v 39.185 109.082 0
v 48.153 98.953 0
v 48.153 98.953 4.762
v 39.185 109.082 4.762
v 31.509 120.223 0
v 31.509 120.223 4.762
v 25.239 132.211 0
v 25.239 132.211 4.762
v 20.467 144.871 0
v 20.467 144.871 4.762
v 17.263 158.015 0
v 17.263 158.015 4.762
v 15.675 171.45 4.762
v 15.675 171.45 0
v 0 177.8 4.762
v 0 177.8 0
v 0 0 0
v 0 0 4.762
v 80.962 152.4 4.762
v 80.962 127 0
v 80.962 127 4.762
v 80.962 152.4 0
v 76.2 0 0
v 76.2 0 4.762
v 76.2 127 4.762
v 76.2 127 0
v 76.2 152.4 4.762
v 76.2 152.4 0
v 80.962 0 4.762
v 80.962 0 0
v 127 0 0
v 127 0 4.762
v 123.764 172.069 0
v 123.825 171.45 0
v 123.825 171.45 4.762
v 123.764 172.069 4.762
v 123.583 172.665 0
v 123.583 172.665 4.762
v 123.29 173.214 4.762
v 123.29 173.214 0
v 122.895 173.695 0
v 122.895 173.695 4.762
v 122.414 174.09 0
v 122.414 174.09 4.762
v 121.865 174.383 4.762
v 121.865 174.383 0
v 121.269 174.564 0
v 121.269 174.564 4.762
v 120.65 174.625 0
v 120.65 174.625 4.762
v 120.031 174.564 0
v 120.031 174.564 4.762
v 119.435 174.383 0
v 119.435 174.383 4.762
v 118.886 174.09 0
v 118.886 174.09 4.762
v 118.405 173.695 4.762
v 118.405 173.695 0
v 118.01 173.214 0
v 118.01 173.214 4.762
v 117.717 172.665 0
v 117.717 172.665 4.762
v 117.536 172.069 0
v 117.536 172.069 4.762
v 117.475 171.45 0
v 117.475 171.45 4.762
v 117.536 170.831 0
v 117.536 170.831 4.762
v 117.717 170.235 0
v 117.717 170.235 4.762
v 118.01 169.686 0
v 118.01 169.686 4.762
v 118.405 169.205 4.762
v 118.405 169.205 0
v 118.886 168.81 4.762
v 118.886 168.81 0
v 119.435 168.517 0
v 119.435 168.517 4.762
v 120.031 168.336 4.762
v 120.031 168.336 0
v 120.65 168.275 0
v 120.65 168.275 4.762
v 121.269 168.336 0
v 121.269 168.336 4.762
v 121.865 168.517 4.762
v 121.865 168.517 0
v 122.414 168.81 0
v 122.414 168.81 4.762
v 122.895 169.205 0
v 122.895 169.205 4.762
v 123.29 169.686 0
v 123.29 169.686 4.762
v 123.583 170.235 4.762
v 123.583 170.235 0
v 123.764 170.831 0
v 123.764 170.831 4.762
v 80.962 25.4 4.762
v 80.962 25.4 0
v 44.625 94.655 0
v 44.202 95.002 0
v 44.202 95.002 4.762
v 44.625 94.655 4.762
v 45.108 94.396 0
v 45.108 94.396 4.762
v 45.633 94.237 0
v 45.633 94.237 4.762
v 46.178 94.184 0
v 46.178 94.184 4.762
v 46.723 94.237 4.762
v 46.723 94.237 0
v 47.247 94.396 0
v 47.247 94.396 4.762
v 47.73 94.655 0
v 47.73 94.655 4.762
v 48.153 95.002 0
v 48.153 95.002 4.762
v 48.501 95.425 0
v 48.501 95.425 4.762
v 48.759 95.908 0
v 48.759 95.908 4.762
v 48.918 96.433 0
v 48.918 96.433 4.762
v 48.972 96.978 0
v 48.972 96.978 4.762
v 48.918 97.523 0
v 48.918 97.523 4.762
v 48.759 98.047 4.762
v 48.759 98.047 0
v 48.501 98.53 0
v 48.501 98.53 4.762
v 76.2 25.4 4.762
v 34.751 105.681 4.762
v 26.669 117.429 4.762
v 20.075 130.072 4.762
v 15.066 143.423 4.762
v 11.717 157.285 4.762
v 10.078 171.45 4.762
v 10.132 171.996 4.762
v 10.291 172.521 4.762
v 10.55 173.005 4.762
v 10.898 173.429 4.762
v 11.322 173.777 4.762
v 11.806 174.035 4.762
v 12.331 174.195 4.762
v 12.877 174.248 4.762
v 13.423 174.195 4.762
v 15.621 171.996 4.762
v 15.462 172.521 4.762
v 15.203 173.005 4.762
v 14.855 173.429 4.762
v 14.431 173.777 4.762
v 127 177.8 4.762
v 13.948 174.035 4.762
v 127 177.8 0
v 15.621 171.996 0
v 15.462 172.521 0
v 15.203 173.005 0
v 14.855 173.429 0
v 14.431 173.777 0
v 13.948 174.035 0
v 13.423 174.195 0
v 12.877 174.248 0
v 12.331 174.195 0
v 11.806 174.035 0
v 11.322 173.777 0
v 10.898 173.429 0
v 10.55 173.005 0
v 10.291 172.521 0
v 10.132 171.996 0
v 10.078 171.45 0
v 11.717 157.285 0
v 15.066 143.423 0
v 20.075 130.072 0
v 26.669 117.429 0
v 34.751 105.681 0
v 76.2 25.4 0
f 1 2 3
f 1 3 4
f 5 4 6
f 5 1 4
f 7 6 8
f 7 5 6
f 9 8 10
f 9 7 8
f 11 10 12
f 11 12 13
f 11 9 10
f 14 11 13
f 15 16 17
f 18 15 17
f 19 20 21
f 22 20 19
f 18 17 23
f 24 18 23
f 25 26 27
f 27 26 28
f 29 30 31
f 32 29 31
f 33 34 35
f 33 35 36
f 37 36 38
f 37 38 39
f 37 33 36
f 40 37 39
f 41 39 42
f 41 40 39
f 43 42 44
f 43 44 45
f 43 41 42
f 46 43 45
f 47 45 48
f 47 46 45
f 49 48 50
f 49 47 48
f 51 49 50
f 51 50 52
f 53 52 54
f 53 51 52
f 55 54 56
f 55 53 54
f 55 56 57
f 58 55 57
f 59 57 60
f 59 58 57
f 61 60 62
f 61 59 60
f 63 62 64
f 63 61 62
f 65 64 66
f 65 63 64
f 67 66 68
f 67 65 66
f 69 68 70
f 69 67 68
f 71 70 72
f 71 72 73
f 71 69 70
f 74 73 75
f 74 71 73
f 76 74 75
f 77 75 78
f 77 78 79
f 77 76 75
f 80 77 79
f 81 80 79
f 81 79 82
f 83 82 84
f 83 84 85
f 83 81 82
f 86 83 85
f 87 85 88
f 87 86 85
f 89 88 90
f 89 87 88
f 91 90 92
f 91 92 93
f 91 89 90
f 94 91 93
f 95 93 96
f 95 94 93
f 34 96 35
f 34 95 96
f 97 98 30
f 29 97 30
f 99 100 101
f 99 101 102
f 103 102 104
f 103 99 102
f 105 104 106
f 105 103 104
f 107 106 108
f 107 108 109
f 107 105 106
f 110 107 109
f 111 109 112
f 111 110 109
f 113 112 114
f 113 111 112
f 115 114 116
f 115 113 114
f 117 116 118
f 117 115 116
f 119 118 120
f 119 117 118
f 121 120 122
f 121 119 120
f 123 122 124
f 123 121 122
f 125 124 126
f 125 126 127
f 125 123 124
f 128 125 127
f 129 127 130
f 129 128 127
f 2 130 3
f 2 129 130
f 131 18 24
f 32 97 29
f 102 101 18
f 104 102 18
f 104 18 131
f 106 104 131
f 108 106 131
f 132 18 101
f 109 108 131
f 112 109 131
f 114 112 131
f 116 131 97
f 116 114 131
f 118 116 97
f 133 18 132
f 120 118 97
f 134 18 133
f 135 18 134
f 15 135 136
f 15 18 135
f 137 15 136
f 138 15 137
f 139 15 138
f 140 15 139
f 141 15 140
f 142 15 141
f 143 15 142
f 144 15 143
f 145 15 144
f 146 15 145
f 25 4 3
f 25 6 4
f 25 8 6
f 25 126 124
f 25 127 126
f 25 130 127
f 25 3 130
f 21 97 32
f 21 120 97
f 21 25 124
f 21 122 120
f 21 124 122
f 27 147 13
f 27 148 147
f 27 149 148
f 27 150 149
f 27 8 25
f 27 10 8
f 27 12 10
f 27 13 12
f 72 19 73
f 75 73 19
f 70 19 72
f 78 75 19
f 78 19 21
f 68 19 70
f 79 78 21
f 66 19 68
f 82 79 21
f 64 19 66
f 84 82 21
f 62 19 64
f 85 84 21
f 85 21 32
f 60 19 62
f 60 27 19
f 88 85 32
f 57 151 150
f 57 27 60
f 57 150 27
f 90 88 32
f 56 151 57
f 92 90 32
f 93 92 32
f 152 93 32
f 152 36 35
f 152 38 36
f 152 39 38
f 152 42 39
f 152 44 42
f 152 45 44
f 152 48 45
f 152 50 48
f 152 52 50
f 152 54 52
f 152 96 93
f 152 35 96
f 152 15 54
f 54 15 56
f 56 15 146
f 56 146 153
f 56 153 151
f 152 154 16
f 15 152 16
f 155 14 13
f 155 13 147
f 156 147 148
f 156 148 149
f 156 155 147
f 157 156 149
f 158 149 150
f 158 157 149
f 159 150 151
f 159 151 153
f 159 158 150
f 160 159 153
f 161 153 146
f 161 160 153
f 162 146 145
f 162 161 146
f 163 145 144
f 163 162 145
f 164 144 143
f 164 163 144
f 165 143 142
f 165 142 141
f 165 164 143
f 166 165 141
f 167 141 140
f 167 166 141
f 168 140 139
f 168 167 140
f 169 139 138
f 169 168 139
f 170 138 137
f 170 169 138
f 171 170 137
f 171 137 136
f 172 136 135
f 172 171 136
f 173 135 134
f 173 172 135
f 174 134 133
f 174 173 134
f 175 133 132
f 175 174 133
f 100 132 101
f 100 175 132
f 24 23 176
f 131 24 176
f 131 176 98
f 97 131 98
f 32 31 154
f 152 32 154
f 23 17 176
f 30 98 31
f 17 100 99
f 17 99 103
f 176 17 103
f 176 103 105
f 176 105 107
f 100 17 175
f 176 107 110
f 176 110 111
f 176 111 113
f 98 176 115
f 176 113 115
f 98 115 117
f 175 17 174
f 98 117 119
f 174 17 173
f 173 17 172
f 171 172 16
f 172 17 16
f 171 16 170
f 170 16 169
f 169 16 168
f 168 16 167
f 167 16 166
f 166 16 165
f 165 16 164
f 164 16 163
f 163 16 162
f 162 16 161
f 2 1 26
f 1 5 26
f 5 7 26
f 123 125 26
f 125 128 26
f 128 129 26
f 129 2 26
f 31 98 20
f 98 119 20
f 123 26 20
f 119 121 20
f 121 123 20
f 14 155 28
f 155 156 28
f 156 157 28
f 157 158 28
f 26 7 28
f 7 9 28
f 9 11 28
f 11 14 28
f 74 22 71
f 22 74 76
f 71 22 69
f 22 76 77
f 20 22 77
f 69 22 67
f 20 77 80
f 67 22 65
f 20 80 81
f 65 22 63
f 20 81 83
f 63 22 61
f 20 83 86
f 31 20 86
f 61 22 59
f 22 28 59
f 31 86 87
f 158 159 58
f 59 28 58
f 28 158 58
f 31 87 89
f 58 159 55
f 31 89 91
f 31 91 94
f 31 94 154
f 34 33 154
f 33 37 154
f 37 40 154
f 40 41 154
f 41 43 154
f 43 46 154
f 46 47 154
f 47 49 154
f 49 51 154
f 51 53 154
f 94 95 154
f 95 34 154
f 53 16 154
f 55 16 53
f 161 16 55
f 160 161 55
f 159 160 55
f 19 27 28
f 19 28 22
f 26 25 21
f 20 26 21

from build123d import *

# Parameters (mm, degrees)
SKETCH1_R           = 3.175
SKETCH1_W           = 4.7625
SKETCH1_H           = 25.4
BOSS_EXTRUDE1_DEPTH = 4.7625


with BuildPart() as part:
    # Sketch1 → Boss-Extrude1 (new body)
    with BuildSketch(Plane.XY):
        Polygon((80.9625, 0), (127, 0), (127, 177.8), (0, 177.8), (0, 0), (76.2, 0), (76.2, 25.4), (80.9625, 25.4), align=None)
        with Locations((120.65, 171.45)):
            Circle(SKETCH1_R, mode=Mode.SUBTRACT)
        with Locations((78.58125, 139.7)):
            Rectangle(SKETCH1_W, SKETCH1_H, mode=Mode.SUBTRACT)
        with BuildLine():
            ThreePointArc((10.07830682, 171.45), (20.074522157, 130.072156721), (44.202038564, 95.002038564))
            ThreePointArc((44.202038564, 95.002038564), (48.153351257, 95.002038564), (48.153351257, 98.953351257))
            ThreePointArc((48.153351257, 98.953351257), (25.239205738, 132.21130856), (15.674955486, 171.45))
            ThreePointArc((15.674955486, 171.45), (12.876631153, 174.248324333), (10.07830682, 171.45))
        make_face(mode=Mode.SUBTRACT)
    extrude(amount=BOSS_EXTRUDE1_DEPTH)


solid = part.part
